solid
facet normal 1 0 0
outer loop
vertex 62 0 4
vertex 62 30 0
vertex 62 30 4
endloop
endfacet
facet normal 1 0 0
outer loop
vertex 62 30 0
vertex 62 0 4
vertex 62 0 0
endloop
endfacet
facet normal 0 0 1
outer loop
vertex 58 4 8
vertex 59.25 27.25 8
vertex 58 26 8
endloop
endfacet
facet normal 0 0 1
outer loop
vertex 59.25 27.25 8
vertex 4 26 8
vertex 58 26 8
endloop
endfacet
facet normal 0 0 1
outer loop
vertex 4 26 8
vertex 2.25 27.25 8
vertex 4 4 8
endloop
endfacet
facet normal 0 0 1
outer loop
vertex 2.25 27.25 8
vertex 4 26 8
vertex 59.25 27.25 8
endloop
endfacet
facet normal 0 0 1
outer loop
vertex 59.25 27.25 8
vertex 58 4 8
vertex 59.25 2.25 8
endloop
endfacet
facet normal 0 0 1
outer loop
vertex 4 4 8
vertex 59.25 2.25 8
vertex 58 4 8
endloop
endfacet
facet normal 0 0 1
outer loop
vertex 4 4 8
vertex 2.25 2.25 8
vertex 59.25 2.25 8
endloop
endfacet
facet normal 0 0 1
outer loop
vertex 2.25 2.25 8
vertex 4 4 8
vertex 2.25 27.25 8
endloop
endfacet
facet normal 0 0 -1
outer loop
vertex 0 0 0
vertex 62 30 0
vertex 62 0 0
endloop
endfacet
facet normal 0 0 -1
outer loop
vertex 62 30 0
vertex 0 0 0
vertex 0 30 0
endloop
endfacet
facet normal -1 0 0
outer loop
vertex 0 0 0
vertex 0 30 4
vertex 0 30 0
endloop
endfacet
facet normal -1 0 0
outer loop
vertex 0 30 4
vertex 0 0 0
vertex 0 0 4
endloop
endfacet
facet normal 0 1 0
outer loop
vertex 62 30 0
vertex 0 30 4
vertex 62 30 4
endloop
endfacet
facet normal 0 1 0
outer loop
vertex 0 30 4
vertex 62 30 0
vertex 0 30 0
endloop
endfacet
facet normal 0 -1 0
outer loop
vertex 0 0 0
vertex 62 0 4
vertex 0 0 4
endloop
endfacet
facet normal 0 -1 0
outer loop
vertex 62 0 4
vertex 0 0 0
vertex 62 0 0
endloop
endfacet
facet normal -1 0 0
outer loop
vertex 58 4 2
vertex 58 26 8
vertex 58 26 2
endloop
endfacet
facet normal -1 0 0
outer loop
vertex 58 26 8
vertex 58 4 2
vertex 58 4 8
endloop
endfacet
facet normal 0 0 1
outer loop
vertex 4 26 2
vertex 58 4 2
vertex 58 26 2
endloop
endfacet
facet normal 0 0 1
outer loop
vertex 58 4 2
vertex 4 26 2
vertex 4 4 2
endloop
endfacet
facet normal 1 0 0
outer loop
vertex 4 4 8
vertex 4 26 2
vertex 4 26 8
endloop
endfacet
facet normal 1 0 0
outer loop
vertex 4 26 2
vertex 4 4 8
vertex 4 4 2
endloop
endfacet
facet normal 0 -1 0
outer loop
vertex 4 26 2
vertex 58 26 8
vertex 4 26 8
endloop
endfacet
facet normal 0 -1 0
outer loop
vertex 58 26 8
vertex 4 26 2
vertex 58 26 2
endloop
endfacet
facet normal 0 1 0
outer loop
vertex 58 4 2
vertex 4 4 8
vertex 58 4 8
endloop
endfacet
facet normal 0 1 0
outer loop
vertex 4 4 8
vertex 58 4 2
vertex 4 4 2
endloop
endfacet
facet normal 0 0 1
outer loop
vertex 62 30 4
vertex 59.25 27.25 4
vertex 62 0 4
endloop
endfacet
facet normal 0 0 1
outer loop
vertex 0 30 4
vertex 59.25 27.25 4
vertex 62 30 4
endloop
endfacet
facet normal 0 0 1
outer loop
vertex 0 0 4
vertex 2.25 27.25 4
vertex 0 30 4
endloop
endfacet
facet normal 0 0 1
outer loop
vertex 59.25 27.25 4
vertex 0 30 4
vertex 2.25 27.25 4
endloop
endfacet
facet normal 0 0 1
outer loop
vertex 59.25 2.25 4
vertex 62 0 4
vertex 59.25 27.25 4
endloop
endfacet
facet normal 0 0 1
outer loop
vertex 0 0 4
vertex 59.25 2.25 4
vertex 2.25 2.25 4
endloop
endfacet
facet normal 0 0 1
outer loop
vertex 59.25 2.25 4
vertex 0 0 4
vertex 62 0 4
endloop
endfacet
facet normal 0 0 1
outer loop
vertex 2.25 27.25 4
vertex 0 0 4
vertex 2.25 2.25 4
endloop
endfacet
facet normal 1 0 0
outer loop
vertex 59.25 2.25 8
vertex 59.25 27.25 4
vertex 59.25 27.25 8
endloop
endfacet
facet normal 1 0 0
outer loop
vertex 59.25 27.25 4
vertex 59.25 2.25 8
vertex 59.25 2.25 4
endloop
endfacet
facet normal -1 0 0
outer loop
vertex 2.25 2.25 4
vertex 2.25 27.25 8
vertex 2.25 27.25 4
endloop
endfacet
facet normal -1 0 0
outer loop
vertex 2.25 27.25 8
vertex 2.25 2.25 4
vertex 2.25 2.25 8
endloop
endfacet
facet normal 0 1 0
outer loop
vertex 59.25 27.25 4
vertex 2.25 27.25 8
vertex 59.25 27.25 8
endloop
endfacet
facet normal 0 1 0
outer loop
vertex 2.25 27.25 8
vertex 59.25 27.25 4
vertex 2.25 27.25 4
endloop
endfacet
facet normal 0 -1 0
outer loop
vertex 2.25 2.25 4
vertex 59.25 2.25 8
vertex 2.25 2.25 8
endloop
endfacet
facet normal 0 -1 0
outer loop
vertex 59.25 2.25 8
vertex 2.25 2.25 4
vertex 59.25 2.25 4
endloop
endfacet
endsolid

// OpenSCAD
// file: common.scad
//---------------------------------------------------------------------------
// Common definitions for the Night Light case
//---------------------------------------------------------------------------
// 27-Mar-2014 ShaneG
//
// This file contains the common definitions (dimensions and utility modules)
// used to generate the two halves of the Night Light case.
//---------------------------------------------------------------------------

// Printer resolution (used for spheres and circles)
RESOLUTION = 0.1;

// Shell information
SHELL_SIZE   = 2;

// Size for the board + battery pack
PCB_WIDTH  = 58;
PCB_HEIGHT = 26;
PCB_DEPTH  = 92;

// Case dimensions (bottom)
CASE_WIDTH   = PCB_WIDTH + (2 * SHELL_SIZE);
CASE_HEIGHT  = PCB_HEIGHT + (2 * SHELL_SIZE);
CASE_DEPTH   = PCB_DEPTH + (2 * SHELL_SIZE);

// Overlap sizes
OVERLAP_ADJUST      = 0.25;

CASE_OVERLAP_DEPTH  = SHELL_SIZE * 2;
CASE_OVERLAP_WIDTH  = 2 * OVERLAP_ADJUST;
CASE_OVERLAP_HEIGHT = 2 * OVERLAP_ADJUST;

// Case dimensions (top)
CASE_TOP_WIDTH  = PCB_WIDTH + (2 * SHELL_SIZE);
CASE_TOP_HEIGHT = PCB_HEIGHT + (2 * SHELL_SIZE);
CASE_TOP_DEPTH  = 2 * CASE_OVERLAP_DEPTH;
// main file
/*--------------------------------------------------------------------------*
* 24-May-2014 ShaneG
*
* The top part of the case for the Bluebell ambient device. This is best
* printed in white.
*--------------------------------------------------------------------------*/
include <common.scad>;

difference() {
  // Main section for the top
  difference() {
    // Build the main cube
    cube(size = [ CASE_TOP_WIDTH, CASE_TOP_HEIGHT, CASE_TOP_DEPTH ], center = false);
    // Make it hollow
    translate(v = [ SHELL_SIZE * 2, SHELL_SIZE * 2, SHELL_SIZE ]) {
      cube(size = [ PCB_WIDTH - (SHELL_SIZE * 2), PCB_HEIGHT - (SHELL_SIZE * 2), CASE_TOP_DEPTH ], center = false);
      }
    }
  // Cutaway for the overlap
  translate(v = [ -OVERLAP_ADJUST, -OVERLAP_ADJUST, CASE_TOP_DEPTH - CASE_OVERLAP_DEPTH ]) {
    difference() {
      // Build the main cube
      cube(size = [ CASE_TOP_WIDTH + (2 * OVERLAP_ADJUST), CASE_TOP_HEIGHT + (2 * OVERLAP_ADJUST), 1.5 * CASE_OVERLAP_DEPTH ], center = false);
      // Make it hollow
      translate(v = [ SHELL_SIZE + CASE_OVERLAP_WIDTH, SHELL_SIZE + CASE_OVERLAP_HEIGHT, -CASE_OVERLAP_DEPTH ]) {
        cube(size = [ CASE_TOP_WIDTH - ((SHELL_SIZE + CASE_OVERLAP_WIDTH) * 2), CASE_TOP_HEIGHT - ((SHELL_SIZE + CASE_OVERLAP_HEIGHT) * 2), 3 * CASE_OVERLAP_DEPTH ], center = false);
        }
      }
    }
  }
